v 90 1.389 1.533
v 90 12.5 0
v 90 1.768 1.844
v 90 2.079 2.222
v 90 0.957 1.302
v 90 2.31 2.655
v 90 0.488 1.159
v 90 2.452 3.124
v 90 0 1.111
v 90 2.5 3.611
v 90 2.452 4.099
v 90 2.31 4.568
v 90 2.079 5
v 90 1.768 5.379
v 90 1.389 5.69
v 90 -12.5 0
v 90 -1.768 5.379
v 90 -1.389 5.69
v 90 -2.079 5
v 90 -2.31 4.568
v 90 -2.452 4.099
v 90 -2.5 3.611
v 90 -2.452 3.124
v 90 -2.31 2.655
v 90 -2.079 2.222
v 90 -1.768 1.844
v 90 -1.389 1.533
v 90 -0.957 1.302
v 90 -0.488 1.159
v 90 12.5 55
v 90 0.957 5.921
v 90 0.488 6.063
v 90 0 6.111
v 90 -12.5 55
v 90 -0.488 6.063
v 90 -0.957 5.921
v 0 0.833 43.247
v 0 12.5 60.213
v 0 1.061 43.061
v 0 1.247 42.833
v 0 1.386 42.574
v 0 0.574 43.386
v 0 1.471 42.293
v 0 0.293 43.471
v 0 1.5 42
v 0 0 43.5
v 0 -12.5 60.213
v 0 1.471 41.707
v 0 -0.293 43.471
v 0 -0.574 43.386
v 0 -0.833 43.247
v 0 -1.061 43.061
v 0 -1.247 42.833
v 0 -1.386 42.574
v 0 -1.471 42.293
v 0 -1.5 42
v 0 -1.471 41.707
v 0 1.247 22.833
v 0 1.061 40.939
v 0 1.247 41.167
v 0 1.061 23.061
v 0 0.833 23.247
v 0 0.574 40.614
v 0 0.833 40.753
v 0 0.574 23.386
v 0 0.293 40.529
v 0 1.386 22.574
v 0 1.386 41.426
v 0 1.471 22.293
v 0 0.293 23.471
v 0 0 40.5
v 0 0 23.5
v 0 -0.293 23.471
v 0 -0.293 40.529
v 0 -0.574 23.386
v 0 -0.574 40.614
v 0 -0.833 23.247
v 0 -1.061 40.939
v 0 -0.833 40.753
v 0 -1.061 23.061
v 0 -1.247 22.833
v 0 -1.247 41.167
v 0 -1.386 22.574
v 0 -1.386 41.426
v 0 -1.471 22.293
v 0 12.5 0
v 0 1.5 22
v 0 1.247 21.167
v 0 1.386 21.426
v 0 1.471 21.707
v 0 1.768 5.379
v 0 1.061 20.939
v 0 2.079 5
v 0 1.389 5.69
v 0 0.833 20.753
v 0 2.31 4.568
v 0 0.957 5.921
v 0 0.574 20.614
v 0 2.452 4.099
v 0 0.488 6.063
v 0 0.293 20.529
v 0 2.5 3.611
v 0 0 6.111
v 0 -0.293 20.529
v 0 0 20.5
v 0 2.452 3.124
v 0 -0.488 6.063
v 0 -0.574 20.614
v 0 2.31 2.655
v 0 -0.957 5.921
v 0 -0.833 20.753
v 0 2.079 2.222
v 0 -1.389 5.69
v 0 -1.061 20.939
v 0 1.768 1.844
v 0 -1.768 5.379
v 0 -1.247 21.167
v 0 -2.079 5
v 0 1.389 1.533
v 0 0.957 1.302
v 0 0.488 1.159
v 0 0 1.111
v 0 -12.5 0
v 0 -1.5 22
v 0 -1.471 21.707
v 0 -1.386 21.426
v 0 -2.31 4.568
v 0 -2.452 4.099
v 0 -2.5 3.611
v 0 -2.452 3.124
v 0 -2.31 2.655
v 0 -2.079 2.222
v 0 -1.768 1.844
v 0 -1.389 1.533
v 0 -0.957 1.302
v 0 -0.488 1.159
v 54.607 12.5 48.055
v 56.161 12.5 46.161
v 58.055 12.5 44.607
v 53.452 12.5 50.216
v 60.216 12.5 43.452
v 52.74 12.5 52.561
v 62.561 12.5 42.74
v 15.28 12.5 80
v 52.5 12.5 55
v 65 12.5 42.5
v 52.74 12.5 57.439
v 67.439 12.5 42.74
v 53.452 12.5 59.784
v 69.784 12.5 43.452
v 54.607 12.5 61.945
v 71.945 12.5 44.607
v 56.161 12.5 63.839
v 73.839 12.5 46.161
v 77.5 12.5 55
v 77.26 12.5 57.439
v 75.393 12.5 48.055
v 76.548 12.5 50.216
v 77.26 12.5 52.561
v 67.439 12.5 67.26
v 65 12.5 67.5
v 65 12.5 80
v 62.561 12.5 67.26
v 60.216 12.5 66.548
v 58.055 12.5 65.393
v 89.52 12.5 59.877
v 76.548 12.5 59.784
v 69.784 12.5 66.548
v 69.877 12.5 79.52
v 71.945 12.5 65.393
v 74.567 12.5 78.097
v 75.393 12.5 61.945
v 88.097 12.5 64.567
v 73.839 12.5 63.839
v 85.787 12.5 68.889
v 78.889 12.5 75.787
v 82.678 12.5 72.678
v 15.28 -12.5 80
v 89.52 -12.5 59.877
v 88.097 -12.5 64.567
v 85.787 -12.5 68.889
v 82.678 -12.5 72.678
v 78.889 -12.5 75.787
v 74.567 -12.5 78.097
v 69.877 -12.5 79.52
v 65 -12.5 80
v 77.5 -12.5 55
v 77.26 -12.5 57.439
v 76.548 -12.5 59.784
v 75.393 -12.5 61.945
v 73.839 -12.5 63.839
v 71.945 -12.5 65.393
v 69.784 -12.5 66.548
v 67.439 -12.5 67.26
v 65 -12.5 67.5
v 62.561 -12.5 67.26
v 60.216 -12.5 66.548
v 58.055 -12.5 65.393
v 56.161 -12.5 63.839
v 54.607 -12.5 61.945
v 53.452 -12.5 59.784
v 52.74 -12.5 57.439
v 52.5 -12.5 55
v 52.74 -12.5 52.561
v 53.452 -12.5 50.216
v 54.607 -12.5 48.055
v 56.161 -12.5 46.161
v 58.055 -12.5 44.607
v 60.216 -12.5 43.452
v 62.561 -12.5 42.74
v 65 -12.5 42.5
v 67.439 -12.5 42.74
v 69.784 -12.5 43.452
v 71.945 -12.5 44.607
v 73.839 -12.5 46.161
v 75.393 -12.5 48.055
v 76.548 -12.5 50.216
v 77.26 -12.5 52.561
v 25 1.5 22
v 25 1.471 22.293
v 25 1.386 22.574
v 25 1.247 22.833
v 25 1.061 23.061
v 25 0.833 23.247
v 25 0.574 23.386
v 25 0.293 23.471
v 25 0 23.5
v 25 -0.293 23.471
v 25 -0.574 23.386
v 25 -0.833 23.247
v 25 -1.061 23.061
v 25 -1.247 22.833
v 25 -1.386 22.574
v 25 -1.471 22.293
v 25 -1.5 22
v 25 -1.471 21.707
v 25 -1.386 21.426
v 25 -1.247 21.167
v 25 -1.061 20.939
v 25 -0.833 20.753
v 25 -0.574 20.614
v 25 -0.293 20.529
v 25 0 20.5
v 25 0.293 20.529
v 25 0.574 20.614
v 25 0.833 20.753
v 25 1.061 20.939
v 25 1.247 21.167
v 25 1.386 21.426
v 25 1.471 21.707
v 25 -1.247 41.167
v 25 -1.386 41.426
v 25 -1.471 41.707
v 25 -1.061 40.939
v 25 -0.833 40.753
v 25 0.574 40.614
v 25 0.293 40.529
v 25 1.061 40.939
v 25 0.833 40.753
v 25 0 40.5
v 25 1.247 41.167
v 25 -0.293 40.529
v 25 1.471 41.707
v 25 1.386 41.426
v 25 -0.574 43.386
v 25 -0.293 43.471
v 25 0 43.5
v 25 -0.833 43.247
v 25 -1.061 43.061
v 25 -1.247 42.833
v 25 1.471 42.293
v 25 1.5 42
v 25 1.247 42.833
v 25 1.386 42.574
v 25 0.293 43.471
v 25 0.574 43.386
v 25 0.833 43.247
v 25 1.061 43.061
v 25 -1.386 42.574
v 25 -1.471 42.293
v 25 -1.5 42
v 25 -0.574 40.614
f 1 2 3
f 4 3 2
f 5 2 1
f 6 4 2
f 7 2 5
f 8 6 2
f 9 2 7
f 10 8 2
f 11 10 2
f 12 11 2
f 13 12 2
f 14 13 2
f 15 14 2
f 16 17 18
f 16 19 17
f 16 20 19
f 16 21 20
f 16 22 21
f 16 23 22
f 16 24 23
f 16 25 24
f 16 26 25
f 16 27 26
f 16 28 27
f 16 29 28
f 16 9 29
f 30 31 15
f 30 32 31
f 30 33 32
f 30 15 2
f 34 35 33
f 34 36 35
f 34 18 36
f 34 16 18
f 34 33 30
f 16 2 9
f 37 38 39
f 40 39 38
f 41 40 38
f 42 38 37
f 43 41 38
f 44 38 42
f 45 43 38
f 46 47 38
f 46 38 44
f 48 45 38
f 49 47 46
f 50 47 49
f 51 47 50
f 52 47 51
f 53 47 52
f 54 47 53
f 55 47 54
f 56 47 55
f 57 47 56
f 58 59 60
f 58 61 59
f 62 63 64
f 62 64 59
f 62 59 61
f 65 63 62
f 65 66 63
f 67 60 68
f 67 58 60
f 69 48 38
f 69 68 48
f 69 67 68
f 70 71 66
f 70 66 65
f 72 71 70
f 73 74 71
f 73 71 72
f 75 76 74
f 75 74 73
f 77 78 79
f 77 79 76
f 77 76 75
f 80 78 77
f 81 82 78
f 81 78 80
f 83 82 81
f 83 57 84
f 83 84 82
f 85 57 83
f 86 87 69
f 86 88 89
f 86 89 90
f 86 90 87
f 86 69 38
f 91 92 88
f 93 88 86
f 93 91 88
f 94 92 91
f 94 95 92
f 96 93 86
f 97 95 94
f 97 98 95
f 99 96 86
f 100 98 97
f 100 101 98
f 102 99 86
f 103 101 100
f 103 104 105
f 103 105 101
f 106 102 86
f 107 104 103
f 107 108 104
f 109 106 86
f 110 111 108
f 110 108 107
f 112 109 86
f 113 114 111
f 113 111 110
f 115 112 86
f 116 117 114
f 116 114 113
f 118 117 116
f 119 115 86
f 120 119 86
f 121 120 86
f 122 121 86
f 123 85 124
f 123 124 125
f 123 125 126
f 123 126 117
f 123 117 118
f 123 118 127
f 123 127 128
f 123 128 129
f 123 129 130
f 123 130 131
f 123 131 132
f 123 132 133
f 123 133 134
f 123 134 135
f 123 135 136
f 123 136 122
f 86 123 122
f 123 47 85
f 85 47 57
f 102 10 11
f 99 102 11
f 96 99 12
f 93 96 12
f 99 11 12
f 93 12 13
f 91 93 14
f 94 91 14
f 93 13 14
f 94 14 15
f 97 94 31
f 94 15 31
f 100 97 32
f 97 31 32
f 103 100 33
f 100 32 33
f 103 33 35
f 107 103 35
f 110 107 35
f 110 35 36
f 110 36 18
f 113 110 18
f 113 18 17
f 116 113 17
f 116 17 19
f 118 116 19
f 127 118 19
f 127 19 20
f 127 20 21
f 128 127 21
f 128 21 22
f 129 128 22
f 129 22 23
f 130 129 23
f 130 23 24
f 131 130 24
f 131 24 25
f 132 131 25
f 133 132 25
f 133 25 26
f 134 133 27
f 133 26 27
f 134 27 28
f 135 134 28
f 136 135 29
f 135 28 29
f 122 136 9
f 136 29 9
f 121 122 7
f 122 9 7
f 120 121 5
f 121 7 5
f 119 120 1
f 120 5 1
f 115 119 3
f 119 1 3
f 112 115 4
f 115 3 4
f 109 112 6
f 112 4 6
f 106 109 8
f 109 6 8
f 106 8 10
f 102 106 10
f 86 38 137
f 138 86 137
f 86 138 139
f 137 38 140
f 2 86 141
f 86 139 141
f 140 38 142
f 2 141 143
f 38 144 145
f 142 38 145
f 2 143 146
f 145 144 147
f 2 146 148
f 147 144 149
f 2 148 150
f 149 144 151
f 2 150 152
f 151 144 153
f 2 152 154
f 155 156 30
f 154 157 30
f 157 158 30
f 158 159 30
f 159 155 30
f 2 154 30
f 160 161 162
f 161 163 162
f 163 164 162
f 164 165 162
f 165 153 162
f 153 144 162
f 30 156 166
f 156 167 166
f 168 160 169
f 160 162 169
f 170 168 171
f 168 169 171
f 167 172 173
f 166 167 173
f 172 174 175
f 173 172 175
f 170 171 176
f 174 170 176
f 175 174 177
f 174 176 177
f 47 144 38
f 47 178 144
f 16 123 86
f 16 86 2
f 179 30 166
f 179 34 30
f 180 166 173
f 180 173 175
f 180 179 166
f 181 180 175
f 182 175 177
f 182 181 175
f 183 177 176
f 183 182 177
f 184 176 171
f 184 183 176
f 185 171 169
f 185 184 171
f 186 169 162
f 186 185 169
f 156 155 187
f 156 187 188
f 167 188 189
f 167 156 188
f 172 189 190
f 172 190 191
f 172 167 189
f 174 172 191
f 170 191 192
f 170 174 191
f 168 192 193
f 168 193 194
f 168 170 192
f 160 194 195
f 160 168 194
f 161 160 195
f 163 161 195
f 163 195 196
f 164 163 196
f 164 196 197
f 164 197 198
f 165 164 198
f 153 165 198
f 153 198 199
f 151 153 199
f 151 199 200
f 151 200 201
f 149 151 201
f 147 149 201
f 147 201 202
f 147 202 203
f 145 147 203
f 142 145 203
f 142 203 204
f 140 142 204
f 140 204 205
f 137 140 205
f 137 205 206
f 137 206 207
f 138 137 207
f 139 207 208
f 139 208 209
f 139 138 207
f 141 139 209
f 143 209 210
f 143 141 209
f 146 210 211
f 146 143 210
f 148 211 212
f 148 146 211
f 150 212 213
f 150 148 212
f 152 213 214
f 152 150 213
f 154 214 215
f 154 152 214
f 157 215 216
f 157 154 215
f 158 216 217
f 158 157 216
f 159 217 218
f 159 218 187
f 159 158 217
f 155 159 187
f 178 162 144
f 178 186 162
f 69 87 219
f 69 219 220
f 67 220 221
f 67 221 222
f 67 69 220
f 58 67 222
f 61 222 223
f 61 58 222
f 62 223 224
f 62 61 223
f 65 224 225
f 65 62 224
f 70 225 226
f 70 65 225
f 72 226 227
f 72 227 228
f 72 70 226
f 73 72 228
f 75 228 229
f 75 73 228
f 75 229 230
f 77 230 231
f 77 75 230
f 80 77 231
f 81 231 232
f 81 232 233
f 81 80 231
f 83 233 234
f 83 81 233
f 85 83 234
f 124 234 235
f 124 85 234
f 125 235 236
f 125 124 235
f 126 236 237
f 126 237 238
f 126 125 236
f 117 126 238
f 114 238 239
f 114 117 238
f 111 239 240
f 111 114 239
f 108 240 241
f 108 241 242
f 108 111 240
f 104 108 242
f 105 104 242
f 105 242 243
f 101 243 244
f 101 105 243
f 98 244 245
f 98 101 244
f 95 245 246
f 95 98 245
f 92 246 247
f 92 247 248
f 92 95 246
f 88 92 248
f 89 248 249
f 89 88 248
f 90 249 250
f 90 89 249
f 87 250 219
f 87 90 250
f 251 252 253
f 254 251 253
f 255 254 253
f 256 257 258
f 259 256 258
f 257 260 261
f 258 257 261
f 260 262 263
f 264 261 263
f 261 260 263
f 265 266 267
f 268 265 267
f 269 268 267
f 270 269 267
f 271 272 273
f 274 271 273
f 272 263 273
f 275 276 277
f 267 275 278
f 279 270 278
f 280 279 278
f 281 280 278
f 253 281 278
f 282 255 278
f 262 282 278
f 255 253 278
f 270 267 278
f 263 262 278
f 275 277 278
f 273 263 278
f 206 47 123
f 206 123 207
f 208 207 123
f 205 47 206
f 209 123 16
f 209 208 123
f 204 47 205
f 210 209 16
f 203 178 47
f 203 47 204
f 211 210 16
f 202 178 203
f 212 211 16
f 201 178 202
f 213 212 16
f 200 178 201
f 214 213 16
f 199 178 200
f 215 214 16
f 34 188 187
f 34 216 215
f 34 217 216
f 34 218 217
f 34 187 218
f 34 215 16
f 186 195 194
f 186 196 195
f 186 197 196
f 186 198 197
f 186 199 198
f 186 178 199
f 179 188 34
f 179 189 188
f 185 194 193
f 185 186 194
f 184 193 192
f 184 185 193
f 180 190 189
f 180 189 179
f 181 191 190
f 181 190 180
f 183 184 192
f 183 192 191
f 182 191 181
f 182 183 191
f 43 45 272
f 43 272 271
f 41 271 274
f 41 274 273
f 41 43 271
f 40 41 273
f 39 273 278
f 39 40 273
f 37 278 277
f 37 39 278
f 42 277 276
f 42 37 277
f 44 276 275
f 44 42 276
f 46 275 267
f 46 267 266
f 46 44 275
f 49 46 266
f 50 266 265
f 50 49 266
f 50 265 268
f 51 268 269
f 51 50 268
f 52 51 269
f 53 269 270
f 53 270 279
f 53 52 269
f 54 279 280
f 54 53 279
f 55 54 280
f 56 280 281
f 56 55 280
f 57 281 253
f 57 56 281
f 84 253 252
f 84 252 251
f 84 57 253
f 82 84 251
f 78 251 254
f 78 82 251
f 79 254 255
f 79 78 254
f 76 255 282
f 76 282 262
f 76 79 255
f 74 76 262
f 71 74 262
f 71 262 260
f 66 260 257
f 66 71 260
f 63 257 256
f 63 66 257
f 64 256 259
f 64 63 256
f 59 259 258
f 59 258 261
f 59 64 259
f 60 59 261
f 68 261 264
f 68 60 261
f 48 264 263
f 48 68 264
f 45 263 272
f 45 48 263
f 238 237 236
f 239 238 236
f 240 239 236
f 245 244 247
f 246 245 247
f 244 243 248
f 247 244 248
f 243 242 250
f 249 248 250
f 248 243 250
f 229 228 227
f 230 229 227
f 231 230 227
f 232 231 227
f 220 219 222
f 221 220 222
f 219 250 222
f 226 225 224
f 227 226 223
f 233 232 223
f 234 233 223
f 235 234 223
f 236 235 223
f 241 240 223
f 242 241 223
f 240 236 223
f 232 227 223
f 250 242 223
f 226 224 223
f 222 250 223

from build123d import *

# Parameters (mm, degrees)
F0_R     = 12.5
F1_DEPTH = 12.5
F2_DEPTH = 12.501
F3_DEPTH = 12.5
F4_R     = 1.5
F5_DEPTH = 25
F6_R     = 2.5
F7_DEPTH = 90.001


# Not quite as in the source:
# - a feature names something its author has since deleted; it is built from what else it names


with BuildPart() as f1:
    # F0 (on Front) → F1 (new body, symmetric)
    with BuildSketch(Plane.XZ):
        Polygon((25.6665702909, 80), (15.280091039, 80), (0, 60.2131655427), (0, 40.0504879653), align=None)
        with BuildLine():
            Line((65, 80), (25.6665702909, 80))
            Line((25.6665702909, 80), (0, 40.0504879653))
            Line((0, 40.0504879653), (0, 0))
            Line((0, 0), (90, 0))
            Line((90, 0), (90, 55))
            ThreePointArc((90, 55), (82.6776695297, 72.6776695297), (65, 80))
        make_face()
        with Locations((65, 55)):
            Circle(F0_R, mode=Mode.SUBTRACT)
    extrude(amount=F1_DEPTH, both=True)

    # F0 (on Front) → F2 (cut, through all)
    with BuildSketch(Plane.XZ):
        Polygon((25.6665702909, 80), (15.280091039, 80), (0, 60.2131655427), (0, 40.0504879653), align=None)
        with BuildLine():
            Line((65, 80), (25.6665702909, 80))
            Line((25.6665702909, 80), (0, 40.0504879653))
            Line((0, 40.0504879653), (0, 0))
            Line((0, 0), (90, 0))
            Line((90, 0), (90, 55))
            ThreePointArc((90, 55), (82.6776695297, 72.6776695297), (65, 80))
        make_face()
        with Locations((65, 55)):
            Circle(F0_R, mode=Mode.SUBTRACT)
    extrude(amount=-F2_DEPTH, mode=Mode.SUBTRACT)

    # F0 (on Front) → F3 (join, symmetric)
    with BuildSketch(Plane.XZ):
        Polygon((25.6665702909, 80), (15.280091039, 80), (0, 60.2131655427), (0, 40.0504879653), align=None)
        with BuildLine():
            Line((65, 80), (25.6665702909, 80))
            Line((25.6665702909, 80), (0, 40.0504879653))
            Line((0, 40.0504879653), (0, 0))
            Line((0, 0), (90, 0))
            Line((90, 0), (90, 55))
            ThreePointArc((90, 55), (82.6776695297, 72.6776695297), (65, 80))
        make_face()
        with Locations((65, 55)):
            Circle(F0_R, mode=Mode.SUBTRACT)
    extrude(amount=F3_DEPTH, both=True)

    # F4 (on Right) → F5 (cut)
    with BuildSketch(Plane.YZ):
        with Locations((0, 22)):
            Circle(F4_R)
        with Locations((0, 42)):
            Circle(F4_R)
    extrude(amount=F5_DEPTH, mode=Mode.SUBTRACT)

    # F6 (on face) → F7 (cut, through all)
    with BuildSketch(Plane.YZ.offset(90)):
        with Locations((0, 3.611382097)):
            Circle(F6_R)
    extrude(amount=-F7_DEPTH, mode=Mode.SUBTRACT)


solid = f1.part
